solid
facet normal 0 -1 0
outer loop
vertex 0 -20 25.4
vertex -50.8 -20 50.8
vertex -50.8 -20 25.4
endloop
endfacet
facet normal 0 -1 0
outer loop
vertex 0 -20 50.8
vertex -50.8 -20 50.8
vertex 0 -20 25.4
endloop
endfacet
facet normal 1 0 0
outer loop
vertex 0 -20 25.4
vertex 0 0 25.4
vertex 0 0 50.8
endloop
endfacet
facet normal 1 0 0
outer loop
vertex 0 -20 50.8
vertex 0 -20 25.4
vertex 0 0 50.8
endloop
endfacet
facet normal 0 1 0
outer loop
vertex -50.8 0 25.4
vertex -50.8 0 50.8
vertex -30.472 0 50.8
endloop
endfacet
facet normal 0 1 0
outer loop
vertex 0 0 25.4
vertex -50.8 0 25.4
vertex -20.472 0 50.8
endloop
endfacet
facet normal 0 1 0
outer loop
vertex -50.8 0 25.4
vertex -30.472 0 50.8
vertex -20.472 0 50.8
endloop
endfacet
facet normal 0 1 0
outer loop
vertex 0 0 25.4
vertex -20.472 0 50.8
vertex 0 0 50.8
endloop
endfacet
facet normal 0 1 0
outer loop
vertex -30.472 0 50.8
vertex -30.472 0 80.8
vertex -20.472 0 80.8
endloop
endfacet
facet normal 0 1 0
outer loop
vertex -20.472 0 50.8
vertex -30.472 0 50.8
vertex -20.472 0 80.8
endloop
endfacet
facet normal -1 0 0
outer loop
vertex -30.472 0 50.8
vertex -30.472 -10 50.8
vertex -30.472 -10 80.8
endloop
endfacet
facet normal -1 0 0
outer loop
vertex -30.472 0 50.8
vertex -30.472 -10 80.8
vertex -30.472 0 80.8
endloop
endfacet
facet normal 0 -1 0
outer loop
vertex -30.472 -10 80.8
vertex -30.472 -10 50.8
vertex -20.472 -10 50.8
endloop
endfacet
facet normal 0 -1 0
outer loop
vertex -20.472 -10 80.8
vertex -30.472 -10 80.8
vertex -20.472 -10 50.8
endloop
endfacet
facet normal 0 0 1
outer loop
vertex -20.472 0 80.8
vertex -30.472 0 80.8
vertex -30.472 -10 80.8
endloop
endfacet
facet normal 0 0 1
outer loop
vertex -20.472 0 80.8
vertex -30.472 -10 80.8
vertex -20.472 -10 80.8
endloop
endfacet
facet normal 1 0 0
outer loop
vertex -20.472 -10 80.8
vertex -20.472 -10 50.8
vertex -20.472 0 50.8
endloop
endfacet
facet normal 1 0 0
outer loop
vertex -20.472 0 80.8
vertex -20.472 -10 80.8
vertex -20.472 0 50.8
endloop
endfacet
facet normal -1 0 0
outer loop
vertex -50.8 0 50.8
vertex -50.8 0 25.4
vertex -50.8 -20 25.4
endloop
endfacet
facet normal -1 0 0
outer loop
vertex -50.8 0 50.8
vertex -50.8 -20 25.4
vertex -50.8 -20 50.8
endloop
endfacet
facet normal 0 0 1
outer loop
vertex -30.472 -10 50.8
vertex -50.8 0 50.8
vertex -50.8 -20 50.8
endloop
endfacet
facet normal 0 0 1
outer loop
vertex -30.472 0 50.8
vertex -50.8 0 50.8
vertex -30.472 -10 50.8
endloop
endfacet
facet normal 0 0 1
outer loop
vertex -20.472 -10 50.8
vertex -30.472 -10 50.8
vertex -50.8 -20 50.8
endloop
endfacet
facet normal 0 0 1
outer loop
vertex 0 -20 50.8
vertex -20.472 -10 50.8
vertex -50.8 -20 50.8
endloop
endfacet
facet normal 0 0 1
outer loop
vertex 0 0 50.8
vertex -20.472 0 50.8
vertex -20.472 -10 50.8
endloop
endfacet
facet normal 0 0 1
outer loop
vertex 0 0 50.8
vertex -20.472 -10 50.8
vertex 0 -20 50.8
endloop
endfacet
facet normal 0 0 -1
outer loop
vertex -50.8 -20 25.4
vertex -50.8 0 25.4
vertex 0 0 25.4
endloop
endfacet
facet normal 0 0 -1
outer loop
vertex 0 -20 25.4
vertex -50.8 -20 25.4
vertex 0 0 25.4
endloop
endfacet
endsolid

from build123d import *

# Parameters (mm, degrees)
F0_W     = 50.8
F0_H     = 50.8
F1_DEPTH = 20
F3_DEPTH = 25.4
F4_W     = 10
F4_H     = 10
F5_DEPTH = 30


with BuildPart() as f1:
    # F0 (on Front) → F1 (new body)
    with BuildSketch(Plane.XZ):
        with Locations((-25.4, 25.4)):
            Rectangle(F0_W, F0_H)
    extrude(amount=F1_DEPTH)

    # F3 (cut): a face of the model
    f3_faces = [f1.faces().sort_by_distance(p)[0] for p in [
        (-25.4, -10, 0),
    ]]
    extrude(f3_faces, amount=-F3_DEPTH, mode=Mode.SUBTRACT)

    # F4 (on face) → F5 (join)
    with BuildSketch(Plane.XY.offset(50.8)):
        with Locations((-25.4721167684, -5)):
            Rectangle(F4_W, F4_H)
    extrude(amount=F5_DEPTH)


solid = f1.part
